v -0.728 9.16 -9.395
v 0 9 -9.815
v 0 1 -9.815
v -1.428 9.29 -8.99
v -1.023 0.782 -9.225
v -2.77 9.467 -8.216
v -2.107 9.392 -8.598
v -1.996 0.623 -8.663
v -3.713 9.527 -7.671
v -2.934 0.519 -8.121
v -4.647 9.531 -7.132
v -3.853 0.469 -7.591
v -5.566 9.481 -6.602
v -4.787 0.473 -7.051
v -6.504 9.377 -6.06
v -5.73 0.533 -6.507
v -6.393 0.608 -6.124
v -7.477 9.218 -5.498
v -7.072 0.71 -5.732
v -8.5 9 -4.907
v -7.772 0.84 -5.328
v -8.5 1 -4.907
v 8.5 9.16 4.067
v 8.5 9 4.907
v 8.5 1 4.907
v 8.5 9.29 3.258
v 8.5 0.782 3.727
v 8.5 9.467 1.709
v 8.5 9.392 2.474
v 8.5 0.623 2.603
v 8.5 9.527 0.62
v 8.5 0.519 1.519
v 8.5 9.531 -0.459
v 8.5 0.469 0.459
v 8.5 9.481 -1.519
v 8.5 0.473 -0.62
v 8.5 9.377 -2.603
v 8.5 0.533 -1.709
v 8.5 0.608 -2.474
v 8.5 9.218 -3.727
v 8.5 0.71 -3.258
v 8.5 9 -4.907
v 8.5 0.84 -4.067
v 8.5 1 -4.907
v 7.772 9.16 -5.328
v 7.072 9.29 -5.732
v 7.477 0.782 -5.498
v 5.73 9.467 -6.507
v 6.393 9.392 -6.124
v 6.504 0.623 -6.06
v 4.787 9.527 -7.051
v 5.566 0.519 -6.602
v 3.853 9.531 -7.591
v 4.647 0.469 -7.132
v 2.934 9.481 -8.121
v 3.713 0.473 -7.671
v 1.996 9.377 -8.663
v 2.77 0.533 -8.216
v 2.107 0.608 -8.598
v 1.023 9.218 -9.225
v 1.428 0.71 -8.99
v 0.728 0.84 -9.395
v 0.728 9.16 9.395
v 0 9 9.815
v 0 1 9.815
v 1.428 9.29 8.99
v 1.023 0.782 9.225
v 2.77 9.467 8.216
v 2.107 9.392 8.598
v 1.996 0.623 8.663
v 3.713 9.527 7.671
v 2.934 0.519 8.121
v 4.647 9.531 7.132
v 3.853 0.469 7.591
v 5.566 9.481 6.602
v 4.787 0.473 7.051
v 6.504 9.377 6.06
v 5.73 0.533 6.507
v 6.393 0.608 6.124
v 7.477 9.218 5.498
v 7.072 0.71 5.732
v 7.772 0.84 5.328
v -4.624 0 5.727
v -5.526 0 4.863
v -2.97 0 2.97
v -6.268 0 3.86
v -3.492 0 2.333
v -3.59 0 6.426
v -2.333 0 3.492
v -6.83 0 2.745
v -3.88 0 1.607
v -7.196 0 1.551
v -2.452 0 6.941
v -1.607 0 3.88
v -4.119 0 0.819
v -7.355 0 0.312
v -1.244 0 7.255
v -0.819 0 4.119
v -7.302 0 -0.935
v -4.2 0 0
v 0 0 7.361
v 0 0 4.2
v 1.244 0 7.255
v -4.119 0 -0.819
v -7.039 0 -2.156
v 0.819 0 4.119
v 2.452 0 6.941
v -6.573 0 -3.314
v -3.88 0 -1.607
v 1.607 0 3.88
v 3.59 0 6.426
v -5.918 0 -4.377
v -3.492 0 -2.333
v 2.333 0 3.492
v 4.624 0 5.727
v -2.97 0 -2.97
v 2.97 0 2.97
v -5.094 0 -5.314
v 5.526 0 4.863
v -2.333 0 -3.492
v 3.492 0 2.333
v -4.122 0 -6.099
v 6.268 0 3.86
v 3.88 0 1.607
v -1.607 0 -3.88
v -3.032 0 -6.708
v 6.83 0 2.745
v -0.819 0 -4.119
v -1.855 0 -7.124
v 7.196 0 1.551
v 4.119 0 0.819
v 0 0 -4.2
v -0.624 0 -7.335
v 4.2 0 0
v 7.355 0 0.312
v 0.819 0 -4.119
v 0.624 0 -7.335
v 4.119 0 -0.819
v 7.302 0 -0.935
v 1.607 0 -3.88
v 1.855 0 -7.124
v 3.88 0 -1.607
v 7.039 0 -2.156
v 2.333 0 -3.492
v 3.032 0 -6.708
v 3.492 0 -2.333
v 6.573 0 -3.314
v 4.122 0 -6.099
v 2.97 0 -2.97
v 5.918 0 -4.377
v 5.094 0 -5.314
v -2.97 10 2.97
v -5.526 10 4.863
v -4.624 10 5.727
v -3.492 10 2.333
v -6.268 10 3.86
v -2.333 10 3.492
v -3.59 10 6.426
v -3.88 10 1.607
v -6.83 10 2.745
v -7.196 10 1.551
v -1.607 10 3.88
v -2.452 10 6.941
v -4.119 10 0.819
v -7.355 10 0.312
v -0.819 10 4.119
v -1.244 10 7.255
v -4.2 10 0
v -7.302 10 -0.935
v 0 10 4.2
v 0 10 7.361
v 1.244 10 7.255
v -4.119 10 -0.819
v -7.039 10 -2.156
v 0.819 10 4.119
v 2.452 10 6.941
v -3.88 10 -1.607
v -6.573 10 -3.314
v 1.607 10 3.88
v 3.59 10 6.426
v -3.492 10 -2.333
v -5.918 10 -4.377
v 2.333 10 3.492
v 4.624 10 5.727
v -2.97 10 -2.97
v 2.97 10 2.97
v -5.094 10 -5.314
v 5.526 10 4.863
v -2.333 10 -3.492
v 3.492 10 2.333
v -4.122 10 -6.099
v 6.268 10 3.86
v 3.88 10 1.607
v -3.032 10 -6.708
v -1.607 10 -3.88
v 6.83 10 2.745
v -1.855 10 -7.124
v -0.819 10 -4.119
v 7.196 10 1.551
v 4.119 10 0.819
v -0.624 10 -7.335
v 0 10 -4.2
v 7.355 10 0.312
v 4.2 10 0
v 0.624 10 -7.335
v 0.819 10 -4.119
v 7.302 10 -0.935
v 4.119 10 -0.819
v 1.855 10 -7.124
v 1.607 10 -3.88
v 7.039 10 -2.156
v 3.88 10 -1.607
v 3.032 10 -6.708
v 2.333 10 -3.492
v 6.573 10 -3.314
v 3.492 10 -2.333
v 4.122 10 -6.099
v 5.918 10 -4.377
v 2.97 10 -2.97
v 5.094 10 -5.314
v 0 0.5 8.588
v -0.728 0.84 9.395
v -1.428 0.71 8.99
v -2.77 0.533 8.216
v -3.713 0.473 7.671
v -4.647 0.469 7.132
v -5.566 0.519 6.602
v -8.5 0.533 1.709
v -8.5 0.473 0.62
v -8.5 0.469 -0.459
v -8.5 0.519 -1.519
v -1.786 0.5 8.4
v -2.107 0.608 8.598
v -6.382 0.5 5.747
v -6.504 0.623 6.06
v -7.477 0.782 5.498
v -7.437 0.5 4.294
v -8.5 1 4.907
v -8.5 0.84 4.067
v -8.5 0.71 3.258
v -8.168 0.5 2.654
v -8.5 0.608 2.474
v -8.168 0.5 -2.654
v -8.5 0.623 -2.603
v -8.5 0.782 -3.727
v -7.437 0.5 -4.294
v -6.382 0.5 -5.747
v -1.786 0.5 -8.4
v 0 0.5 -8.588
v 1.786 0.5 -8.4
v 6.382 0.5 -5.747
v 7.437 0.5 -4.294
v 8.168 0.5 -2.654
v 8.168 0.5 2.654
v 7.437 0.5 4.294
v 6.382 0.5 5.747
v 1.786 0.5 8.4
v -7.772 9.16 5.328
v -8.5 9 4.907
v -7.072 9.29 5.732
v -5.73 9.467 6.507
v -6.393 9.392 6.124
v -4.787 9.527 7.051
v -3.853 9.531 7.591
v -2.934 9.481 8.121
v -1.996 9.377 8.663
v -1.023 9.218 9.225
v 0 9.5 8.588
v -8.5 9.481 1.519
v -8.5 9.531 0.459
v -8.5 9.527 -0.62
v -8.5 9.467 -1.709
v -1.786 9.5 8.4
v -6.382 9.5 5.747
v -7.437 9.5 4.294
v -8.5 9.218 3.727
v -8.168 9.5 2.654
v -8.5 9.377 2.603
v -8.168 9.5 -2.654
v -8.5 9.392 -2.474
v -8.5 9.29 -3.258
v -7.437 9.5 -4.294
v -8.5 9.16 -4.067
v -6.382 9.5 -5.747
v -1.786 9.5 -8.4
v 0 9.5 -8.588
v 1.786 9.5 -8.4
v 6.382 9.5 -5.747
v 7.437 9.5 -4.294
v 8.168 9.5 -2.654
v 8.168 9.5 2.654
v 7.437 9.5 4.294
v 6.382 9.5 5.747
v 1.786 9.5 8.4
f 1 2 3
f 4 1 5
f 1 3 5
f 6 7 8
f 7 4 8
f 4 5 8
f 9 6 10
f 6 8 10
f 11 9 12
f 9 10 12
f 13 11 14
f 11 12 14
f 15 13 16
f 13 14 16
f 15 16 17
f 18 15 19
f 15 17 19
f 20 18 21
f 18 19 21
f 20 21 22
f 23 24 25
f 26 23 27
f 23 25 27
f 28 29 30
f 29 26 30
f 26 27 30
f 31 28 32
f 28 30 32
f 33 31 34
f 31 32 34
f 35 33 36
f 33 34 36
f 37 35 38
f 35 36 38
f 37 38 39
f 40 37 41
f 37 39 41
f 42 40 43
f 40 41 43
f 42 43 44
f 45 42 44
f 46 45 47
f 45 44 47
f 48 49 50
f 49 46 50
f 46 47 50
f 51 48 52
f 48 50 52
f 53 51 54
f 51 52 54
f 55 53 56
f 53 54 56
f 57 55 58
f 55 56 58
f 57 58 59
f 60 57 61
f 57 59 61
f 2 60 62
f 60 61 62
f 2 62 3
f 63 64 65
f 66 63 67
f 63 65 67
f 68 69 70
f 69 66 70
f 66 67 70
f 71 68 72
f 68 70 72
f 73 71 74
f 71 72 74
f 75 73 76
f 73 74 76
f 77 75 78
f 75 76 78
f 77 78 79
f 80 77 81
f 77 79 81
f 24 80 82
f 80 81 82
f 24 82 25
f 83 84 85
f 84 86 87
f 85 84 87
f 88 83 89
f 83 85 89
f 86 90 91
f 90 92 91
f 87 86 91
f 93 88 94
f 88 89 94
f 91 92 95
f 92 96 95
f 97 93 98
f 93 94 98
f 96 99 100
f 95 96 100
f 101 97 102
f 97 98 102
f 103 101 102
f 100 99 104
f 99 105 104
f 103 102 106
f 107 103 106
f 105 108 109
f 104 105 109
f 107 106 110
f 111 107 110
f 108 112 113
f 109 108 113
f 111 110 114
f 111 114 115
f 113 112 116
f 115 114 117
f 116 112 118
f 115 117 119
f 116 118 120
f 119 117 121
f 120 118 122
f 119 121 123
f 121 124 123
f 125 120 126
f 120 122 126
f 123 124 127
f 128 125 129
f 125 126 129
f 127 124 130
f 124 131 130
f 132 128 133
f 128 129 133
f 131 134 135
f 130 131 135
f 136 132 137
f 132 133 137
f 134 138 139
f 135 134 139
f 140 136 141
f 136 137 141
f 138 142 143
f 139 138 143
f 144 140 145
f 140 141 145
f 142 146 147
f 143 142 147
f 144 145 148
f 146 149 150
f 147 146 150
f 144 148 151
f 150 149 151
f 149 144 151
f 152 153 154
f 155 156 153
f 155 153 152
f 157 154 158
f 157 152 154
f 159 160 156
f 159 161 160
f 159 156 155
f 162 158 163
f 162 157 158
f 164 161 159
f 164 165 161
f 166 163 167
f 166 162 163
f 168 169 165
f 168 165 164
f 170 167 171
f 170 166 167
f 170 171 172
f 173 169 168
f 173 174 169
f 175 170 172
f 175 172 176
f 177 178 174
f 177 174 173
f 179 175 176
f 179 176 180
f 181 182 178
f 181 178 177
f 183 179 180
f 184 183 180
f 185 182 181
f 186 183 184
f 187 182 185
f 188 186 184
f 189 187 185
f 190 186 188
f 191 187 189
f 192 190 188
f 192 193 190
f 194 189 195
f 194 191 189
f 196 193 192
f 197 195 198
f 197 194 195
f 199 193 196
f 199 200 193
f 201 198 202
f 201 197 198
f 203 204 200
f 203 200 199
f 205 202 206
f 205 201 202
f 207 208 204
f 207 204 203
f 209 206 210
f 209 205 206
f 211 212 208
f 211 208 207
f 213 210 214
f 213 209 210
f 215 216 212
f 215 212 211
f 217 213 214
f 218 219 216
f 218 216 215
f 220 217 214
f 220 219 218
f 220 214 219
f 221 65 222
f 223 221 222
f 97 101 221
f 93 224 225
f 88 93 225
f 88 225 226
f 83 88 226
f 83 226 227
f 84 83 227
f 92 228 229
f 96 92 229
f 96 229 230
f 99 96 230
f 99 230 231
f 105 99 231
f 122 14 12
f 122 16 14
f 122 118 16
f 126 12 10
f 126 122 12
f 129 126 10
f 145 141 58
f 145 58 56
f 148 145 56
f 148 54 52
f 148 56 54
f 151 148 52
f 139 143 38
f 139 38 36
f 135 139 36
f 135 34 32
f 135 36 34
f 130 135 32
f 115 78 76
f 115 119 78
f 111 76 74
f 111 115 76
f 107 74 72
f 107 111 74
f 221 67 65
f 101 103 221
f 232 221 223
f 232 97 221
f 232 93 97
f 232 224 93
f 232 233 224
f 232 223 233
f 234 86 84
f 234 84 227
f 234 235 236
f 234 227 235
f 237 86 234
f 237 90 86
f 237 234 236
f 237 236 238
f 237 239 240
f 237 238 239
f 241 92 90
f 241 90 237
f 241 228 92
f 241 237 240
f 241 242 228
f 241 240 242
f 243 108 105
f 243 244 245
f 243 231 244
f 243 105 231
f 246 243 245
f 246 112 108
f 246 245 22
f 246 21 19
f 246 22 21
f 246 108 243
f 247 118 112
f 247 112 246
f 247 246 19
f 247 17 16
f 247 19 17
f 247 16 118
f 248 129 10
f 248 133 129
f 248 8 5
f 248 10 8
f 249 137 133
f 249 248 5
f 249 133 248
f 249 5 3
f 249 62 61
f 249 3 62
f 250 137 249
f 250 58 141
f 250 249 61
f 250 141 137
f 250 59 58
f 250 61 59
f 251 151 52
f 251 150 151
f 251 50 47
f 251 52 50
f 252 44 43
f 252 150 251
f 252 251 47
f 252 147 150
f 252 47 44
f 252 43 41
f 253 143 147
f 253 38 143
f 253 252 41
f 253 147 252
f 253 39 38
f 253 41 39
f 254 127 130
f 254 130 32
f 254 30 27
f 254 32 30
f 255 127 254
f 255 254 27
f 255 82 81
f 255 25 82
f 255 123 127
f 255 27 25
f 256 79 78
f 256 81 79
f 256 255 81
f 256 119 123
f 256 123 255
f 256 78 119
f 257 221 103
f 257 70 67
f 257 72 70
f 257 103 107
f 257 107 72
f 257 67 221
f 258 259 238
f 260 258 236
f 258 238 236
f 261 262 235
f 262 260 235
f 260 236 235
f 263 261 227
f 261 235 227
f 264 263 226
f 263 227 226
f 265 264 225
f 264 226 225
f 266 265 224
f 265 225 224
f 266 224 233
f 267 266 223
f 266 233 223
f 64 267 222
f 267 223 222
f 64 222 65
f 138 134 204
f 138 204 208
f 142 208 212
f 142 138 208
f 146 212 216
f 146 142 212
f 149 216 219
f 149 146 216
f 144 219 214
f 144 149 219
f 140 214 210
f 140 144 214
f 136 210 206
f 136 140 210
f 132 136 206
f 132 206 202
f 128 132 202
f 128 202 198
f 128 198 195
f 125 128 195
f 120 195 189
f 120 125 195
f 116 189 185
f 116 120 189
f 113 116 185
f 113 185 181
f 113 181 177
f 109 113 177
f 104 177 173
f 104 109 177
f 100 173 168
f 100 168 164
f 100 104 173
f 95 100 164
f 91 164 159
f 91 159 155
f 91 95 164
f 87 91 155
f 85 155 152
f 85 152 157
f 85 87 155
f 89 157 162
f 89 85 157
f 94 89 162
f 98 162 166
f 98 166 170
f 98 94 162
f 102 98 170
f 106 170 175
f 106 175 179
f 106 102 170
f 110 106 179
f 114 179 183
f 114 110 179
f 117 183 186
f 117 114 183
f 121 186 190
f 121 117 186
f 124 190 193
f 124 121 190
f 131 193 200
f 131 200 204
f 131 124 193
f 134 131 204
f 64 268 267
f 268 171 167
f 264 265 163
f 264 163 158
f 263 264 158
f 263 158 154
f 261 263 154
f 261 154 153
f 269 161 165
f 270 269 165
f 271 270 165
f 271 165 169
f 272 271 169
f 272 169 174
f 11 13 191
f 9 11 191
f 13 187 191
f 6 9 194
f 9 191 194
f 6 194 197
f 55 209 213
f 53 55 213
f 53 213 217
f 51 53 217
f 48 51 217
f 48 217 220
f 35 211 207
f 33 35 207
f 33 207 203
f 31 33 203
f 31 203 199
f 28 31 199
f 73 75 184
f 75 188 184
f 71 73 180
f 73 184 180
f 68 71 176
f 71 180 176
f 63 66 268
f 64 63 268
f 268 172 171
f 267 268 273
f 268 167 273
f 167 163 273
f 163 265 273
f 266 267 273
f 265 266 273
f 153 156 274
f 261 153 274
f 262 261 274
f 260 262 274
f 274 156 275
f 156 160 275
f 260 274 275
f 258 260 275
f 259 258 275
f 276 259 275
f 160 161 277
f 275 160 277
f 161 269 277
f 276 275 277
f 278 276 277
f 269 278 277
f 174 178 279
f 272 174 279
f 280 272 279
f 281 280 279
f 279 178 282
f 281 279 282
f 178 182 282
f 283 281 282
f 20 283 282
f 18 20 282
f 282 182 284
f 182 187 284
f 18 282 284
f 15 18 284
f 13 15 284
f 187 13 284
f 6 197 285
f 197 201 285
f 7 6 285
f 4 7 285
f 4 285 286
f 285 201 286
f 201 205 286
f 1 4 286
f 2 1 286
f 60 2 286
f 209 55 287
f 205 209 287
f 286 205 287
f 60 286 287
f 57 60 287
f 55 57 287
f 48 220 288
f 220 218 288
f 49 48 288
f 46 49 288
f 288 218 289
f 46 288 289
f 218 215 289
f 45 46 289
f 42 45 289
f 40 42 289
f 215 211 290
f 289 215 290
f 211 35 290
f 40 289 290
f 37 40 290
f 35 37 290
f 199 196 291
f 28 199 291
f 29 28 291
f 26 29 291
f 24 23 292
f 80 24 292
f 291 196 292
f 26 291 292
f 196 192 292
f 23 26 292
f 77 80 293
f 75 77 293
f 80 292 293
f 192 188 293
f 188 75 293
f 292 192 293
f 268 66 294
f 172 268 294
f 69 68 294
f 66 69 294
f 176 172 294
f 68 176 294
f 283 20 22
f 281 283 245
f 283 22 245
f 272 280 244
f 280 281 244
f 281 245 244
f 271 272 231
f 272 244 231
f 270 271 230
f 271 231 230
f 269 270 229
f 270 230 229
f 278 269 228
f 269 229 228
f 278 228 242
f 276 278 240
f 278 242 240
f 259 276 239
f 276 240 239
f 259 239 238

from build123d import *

# Parameters (mm, degrees)
SKETCH1_R           = 4.2
BOSS_EXTRUDE1_DEPTH = 10


with BuildPart() as part:
    # Sketch1 → Boss-Extrude1 (new body)
    with BuildSketch(Plane(origin=(0, 0, 0), x_dir=(1, 0, 0), z_dir=(0, 1, 0))):
        Polygon((0, 9.814954576), (-8.5, 4.907477288), (-8.5, -4.907477288), (0, -9.814954576), (8.5, -4.907477288), (8.5, 4.907477288), align=None)
        Circle(SKETCH1_R, mode=Mode.SUBTRACT)
    extrude(amount=BOSS_EXTRUDE1_DEPTH)

    # Sketch2 → Cut-Revolve1 (revolve, cut)
    with BuildSketch(Plane(origin=(0, 0, 0), x_dir=(0, 0, -1), z_dir=(1, 0, 0))):
        Polygon((-9.814954576, 9), (-7.361215932, 10), (-9.814954576, 10), align=None)
        Polygon((-7.361215932, 0), (-9.814954576, 0), (-9.814954576, 1), align=None)
    revolve(axis=Axis((0, 13.206770677, 0), (0, -1, 0)), mode=Mode.SUBTRACT)


solid = part.part
